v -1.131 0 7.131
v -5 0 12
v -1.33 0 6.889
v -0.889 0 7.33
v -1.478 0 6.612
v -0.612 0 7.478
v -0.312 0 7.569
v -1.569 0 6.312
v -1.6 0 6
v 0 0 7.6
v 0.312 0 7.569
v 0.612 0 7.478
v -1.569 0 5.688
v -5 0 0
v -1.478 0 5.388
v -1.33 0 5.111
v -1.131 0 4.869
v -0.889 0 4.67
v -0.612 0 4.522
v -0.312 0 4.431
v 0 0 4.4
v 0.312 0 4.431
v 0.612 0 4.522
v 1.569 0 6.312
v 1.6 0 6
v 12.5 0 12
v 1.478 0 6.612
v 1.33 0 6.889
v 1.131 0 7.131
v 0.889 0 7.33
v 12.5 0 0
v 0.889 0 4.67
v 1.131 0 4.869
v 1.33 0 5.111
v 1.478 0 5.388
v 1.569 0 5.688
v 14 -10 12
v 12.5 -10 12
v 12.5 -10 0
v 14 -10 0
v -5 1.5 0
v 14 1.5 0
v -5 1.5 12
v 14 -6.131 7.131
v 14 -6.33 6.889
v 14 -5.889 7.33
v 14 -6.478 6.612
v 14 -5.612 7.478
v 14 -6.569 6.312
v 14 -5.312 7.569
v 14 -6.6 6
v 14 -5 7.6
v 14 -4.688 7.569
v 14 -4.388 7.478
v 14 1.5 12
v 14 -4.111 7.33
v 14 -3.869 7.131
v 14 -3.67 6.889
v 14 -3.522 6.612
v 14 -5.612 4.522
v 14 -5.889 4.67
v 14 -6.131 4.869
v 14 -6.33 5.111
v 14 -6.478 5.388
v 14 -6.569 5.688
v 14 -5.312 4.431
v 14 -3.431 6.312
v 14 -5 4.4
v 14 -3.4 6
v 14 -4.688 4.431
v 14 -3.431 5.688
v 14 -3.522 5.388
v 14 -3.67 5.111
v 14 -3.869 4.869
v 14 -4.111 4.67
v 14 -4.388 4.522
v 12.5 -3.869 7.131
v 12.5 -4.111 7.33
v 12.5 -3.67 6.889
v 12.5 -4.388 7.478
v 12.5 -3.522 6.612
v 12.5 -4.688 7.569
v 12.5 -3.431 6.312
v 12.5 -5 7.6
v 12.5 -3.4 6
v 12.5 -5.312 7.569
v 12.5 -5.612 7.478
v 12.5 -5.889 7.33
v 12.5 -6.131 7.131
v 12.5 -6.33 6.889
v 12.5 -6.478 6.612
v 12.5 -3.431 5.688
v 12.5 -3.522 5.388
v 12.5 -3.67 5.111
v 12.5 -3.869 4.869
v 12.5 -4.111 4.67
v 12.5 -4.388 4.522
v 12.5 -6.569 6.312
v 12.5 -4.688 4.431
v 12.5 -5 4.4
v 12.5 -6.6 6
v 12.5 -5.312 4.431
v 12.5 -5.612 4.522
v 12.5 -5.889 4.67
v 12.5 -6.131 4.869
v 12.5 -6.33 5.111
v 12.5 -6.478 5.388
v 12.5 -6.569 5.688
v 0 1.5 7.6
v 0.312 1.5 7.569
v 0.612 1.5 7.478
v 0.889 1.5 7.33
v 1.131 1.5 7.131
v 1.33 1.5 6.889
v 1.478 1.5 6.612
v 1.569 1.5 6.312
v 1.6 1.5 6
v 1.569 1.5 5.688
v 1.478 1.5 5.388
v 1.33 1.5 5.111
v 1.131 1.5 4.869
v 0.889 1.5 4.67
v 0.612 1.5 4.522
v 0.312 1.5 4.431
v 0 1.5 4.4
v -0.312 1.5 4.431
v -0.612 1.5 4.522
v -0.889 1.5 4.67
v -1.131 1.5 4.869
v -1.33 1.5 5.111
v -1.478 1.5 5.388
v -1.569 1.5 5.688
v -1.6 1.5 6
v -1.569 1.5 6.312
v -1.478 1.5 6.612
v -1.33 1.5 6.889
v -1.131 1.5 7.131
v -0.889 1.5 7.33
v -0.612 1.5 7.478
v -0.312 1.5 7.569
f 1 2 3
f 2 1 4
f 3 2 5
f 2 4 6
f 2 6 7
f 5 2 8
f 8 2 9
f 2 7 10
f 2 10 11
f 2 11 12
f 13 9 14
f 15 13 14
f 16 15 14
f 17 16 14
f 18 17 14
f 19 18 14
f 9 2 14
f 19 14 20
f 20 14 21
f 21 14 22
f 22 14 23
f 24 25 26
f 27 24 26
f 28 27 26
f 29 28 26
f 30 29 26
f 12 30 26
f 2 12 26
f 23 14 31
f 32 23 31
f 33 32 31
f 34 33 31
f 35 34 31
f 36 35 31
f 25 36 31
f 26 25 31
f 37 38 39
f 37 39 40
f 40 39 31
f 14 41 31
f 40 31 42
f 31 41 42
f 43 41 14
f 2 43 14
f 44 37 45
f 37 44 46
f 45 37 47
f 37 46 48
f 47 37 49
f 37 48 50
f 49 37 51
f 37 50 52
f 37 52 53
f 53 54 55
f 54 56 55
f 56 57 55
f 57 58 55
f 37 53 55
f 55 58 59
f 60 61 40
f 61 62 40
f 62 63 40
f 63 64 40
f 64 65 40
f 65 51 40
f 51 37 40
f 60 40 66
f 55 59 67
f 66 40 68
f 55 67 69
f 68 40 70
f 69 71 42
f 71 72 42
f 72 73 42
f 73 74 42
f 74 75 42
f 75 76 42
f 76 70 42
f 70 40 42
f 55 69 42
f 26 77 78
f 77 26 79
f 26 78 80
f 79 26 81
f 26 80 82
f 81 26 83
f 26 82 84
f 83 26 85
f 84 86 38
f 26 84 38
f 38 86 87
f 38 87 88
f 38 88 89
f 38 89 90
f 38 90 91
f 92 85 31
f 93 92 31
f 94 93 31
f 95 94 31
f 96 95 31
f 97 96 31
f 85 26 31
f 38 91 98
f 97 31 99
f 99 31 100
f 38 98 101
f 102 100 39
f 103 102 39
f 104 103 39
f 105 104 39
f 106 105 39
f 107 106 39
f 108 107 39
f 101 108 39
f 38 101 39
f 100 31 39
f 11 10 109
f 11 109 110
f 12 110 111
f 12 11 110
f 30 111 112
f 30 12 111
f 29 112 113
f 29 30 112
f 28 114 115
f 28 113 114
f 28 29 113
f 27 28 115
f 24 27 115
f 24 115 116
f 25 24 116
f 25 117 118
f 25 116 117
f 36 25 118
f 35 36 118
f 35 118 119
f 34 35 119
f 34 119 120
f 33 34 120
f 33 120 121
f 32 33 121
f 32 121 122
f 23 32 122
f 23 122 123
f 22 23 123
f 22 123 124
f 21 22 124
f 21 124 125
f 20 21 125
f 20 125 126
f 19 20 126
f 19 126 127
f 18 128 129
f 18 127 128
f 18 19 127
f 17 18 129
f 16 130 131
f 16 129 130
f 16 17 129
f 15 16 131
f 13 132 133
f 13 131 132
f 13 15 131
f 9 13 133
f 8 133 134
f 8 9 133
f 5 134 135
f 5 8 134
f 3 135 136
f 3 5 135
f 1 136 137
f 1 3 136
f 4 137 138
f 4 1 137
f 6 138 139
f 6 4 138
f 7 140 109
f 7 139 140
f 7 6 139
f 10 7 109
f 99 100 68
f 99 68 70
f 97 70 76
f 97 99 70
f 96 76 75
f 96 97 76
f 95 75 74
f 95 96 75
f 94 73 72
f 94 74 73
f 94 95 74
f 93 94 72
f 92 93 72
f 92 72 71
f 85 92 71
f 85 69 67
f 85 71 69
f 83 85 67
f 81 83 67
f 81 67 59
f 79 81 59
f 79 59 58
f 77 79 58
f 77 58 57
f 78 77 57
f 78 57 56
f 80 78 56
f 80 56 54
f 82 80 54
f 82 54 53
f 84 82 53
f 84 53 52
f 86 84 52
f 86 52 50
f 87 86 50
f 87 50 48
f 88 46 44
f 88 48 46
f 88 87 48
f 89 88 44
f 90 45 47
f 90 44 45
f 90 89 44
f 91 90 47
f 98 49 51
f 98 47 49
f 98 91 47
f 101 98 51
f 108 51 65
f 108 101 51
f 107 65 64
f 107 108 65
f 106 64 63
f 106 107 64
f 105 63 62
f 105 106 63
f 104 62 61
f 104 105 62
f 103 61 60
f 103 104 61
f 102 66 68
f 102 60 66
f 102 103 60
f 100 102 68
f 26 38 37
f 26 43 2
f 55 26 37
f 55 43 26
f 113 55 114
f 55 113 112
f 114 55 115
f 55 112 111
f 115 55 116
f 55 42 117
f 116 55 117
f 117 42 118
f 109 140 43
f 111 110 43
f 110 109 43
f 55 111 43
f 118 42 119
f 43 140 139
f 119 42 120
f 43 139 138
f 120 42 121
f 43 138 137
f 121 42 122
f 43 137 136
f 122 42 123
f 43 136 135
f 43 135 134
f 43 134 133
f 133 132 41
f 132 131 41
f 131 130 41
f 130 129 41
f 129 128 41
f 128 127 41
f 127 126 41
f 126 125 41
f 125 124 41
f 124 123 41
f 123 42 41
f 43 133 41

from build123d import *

# Parameters (mm, degrees)
F_1P5MM_12_DEPTH            = 12
CUT_EXTRUDE_M3_DEPTH        = 100
CUT_EXTRUDE_M3_DEPTH_BACK   = 100
SKETCH_2_R                  = 1.6
CUT_EXTRUDE_M3_2_DEPTH      = 100
CUT_EXTRUDE_M3_2_DEPTH_BACK = 100
SKETCH_3_R                  = 1.6


with BuildPart() as part:
    # 草图1 → 1p5mm直角固定座_宽12 (new body)
    with BuildSketch(Plane.XY):
        Polygon((-5, 0), (12.5, 0), (12.5, -10), (14, -10), (14, 1.5), (-5, 1.5), align=None)
    extrude(amount=F_1P5MM_12_DEPTH)

    # 草图2 → Cut-Extrude M3 (cut, two sides: drawn at the far end of the back side and taken through both)
    with BuildSketch(Plane(origin=(0, 0, 0), x_dir=(1, 0, 0), z_dir=(0, 1, 0)).offset(-CUT_EXTRUDE_M3_DEPTH_BACK)):
        with Locations(Location((0, -6, 0), (0, 0, 270))):
            Circle(SKETCH_2_R)
    extrude(amount=CUT_EXTRUDE_M3_DEPTH + CUT_EXTRUDE_M3_DEPTH_BACK, mode=Mode.SUBTRACT)

    # 草图3 → Cut-Extrude M3 2 (cut, two sides: drawn at the far end of the back side and taken through both)
    with BuildSketch(Plane(origin=(0, 0, 0), x_dir=(0, 0, -1), z_dir=(1, 0, 0)).offset(-CUT_EXTRUDE_M3_2_DEPTH_BACK)):
        with Locations((-6, -5)):
            Circle(SKETCH_3_R)
    extrude(amount=CUT_EXTRUDE_M3_2_DEPTH + CUT_EXTRUDE_M3_2_DEPTH_BACK, mode=Mode.SUBTRACT)


solid = part.part
